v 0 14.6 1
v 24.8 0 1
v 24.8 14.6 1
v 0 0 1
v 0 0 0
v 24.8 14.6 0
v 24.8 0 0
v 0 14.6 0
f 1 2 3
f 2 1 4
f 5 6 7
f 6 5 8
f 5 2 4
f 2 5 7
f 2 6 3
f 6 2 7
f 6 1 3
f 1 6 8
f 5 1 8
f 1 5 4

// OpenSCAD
$fn = 64;

pcb_length = 24.8;
pcb_width  = 14.6;
pcb_thick  = 1.0;

color([0.05, 0.45, 0.18])
cube([pcb_length, pcb_width, pcb_thick], center=false);
